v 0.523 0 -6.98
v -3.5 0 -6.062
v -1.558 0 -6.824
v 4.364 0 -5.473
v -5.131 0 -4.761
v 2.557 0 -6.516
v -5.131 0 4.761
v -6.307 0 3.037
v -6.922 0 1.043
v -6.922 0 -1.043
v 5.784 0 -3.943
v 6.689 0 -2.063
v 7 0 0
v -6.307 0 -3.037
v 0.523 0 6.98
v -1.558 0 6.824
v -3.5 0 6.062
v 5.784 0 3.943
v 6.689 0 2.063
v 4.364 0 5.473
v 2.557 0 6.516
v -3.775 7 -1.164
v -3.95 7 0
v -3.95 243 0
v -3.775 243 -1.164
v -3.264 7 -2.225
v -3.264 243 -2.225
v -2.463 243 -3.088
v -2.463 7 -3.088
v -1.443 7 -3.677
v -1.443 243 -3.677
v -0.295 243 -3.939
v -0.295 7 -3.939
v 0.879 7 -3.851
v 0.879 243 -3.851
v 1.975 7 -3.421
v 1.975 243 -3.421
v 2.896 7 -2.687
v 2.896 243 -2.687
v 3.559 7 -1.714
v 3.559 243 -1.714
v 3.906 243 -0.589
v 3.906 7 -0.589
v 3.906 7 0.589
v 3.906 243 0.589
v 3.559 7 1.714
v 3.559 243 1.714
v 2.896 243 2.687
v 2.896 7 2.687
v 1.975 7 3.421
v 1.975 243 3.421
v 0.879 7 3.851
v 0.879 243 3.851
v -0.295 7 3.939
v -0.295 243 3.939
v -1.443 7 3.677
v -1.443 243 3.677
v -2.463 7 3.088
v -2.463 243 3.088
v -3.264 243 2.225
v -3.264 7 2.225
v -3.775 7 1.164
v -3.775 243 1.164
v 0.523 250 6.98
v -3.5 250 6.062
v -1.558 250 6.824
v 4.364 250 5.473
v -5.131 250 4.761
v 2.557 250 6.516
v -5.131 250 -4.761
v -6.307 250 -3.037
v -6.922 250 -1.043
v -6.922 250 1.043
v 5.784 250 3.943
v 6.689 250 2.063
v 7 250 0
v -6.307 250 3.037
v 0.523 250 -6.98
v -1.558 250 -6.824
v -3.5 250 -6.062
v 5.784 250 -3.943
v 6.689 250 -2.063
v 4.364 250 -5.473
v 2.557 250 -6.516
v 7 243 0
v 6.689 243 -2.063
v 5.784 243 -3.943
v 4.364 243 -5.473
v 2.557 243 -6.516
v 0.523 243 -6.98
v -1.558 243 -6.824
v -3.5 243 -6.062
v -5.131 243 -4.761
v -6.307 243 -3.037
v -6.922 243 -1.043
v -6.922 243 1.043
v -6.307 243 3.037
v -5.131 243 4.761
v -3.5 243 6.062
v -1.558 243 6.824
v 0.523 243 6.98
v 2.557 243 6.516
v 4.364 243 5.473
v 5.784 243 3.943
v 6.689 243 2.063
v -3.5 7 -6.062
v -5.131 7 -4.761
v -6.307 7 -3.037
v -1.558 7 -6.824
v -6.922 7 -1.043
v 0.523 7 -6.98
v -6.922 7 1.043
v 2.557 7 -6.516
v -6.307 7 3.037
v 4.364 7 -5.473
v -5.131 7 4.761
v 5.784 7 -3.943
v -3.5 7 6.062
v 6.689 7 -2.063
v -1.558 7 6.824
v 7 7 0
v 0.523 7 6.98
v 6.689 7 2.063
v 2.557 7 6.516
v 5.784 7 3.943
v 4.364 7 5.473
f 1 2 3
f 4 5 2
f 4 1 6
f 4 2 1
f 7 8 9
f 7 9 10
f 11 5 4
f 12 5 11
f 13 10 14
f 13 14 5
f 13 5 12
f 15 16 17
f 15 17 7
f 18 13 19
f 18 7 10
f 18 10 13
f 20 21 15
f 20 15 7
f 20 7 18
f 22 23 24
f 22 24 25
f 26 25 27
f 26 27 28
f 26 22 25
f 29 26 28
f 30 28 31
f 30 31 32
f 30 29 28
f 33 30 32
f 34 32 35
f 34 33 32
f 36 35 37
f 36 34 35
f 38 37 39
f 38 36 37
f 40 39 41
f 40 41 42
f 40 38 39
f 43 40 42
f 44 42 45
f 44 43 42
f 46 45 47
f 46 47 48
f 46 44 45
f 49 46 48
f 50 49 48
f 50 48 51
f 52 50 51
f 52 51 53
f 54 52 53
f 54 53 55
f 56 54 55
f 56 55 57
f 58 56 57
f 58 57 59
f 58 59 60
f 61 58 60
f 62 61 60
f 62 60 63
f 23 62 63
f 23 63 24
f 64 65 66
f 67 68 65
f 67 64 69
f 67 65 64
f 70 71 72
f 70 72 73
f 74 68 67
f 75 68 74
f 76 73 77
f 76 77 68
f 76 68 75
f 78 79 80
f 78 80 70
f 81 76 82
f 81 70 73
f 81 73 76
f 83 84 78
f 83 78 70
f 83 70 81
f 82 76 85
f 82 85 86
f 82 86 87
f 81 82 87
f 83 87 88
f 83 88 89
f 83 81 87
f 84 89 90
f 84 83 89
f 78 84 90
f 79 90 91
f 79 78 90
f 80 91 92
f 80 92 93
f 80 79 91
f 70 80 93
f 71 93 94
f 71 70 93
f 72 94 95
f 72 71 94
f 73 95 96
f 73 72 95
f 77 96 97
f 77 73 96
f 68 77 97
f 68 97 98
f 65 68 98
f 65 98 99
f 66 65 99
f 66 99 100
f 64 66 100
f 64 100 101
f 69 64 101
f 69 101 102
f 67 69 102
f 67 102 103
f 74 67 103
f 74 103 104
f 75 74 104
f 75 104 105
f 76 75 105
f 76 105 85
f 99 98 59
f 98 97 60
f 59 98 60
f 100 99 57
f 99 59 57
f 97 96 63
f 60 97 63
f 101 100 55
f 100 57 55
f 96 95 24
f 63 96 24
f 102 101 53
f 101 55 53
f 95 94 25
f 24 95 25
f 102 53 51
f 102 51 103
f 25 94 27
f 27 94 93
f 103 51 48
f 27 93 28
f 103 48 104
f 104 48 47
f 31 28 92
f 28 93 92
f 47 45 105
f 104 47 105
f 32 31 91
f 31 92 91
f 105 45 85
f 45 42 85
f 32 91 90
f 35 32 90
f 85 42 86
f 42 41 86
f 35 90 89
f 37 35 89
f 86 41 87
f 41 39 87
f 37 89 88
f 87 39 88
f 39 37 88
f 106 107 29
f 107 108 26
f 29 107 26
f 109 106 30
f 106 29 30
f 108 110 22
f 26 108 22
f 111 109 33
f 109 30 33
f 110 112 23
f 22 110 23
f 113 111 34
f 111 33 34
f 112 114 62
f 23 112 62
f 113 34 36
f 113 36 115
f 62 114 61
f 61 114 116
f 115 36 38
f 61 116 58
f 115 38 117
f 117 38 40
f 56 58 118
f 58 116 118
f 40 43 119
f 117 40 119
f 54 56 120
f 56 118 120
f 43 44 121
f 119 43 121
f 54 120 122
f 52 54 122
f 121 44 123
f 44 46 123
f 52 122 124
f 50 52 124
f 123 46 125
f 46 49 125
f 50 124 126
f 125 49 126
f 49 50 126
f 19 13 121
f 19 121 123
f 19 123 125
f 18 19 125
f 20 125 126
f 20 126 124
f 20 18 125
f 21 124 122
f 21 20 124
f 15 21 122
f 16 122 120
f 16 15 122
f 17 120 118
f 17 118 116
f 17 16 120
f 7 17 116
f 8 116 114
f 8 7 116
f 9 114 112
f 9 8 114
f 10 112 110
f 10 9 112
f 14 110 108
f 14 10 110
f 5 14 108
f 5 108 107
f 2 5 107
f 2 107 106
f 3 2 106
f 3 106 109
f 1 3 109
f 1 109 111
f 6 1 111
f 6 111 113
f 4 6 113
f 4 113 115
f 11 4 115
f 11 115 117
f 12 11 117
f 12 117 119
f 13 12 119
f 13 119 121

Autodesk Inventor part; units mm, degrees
ref_plane "YZ Plane" through (0, 0, 0) normal (1, 0, 0) x (0, 1, 0)
ref_plane "XZ Plane" through (0, 0, 0) normal (0, 1, 0) x (-1, 0, 0)
ref_plane "XY Plane" through (0, 0, 0) normal (0, 0, 1) x (1, 0, 0)
sketch "Sketch1" plane through (0, 0, 0) normal (0, 1, 0) x (-1, 0, 0)
  circle A0 centre (0, 0) radius 3.95
  circle A1 centre (0, 0) radius 7
  dimension "d0" = 7.9
  dimension "d1" = 14
extrude "Extrusion1" add sketch "Sketch1" along normal blind 250 contours A0
sketch "Sketch2" plane through (0, 250, 0) normal (0, 1, 0) x (1, 0, 0)
  circle A0 centre (0, 0) radius 3.95 projected
  circle A1 centre (0, 0) radius 7
  dimension "d4" = 14
extrude "Extrusion2" add sketch "Sketch2" against normal blind 7
sketch "Sketch3" plane through (0, 0, 0) normal (0, -1, 0) x (1, 0, 0)
  circle A0 centre (0, 0) radius 7 projected
  circle A1 centre (0, 0) radius 7
extrude "Extrusion3" add sketch "Sketch3" against normal blind 7
thread "Thread1" size "M8x1.25" class "6g" standard "ANSI Metric M Profile" full length
properties part number "perno"
